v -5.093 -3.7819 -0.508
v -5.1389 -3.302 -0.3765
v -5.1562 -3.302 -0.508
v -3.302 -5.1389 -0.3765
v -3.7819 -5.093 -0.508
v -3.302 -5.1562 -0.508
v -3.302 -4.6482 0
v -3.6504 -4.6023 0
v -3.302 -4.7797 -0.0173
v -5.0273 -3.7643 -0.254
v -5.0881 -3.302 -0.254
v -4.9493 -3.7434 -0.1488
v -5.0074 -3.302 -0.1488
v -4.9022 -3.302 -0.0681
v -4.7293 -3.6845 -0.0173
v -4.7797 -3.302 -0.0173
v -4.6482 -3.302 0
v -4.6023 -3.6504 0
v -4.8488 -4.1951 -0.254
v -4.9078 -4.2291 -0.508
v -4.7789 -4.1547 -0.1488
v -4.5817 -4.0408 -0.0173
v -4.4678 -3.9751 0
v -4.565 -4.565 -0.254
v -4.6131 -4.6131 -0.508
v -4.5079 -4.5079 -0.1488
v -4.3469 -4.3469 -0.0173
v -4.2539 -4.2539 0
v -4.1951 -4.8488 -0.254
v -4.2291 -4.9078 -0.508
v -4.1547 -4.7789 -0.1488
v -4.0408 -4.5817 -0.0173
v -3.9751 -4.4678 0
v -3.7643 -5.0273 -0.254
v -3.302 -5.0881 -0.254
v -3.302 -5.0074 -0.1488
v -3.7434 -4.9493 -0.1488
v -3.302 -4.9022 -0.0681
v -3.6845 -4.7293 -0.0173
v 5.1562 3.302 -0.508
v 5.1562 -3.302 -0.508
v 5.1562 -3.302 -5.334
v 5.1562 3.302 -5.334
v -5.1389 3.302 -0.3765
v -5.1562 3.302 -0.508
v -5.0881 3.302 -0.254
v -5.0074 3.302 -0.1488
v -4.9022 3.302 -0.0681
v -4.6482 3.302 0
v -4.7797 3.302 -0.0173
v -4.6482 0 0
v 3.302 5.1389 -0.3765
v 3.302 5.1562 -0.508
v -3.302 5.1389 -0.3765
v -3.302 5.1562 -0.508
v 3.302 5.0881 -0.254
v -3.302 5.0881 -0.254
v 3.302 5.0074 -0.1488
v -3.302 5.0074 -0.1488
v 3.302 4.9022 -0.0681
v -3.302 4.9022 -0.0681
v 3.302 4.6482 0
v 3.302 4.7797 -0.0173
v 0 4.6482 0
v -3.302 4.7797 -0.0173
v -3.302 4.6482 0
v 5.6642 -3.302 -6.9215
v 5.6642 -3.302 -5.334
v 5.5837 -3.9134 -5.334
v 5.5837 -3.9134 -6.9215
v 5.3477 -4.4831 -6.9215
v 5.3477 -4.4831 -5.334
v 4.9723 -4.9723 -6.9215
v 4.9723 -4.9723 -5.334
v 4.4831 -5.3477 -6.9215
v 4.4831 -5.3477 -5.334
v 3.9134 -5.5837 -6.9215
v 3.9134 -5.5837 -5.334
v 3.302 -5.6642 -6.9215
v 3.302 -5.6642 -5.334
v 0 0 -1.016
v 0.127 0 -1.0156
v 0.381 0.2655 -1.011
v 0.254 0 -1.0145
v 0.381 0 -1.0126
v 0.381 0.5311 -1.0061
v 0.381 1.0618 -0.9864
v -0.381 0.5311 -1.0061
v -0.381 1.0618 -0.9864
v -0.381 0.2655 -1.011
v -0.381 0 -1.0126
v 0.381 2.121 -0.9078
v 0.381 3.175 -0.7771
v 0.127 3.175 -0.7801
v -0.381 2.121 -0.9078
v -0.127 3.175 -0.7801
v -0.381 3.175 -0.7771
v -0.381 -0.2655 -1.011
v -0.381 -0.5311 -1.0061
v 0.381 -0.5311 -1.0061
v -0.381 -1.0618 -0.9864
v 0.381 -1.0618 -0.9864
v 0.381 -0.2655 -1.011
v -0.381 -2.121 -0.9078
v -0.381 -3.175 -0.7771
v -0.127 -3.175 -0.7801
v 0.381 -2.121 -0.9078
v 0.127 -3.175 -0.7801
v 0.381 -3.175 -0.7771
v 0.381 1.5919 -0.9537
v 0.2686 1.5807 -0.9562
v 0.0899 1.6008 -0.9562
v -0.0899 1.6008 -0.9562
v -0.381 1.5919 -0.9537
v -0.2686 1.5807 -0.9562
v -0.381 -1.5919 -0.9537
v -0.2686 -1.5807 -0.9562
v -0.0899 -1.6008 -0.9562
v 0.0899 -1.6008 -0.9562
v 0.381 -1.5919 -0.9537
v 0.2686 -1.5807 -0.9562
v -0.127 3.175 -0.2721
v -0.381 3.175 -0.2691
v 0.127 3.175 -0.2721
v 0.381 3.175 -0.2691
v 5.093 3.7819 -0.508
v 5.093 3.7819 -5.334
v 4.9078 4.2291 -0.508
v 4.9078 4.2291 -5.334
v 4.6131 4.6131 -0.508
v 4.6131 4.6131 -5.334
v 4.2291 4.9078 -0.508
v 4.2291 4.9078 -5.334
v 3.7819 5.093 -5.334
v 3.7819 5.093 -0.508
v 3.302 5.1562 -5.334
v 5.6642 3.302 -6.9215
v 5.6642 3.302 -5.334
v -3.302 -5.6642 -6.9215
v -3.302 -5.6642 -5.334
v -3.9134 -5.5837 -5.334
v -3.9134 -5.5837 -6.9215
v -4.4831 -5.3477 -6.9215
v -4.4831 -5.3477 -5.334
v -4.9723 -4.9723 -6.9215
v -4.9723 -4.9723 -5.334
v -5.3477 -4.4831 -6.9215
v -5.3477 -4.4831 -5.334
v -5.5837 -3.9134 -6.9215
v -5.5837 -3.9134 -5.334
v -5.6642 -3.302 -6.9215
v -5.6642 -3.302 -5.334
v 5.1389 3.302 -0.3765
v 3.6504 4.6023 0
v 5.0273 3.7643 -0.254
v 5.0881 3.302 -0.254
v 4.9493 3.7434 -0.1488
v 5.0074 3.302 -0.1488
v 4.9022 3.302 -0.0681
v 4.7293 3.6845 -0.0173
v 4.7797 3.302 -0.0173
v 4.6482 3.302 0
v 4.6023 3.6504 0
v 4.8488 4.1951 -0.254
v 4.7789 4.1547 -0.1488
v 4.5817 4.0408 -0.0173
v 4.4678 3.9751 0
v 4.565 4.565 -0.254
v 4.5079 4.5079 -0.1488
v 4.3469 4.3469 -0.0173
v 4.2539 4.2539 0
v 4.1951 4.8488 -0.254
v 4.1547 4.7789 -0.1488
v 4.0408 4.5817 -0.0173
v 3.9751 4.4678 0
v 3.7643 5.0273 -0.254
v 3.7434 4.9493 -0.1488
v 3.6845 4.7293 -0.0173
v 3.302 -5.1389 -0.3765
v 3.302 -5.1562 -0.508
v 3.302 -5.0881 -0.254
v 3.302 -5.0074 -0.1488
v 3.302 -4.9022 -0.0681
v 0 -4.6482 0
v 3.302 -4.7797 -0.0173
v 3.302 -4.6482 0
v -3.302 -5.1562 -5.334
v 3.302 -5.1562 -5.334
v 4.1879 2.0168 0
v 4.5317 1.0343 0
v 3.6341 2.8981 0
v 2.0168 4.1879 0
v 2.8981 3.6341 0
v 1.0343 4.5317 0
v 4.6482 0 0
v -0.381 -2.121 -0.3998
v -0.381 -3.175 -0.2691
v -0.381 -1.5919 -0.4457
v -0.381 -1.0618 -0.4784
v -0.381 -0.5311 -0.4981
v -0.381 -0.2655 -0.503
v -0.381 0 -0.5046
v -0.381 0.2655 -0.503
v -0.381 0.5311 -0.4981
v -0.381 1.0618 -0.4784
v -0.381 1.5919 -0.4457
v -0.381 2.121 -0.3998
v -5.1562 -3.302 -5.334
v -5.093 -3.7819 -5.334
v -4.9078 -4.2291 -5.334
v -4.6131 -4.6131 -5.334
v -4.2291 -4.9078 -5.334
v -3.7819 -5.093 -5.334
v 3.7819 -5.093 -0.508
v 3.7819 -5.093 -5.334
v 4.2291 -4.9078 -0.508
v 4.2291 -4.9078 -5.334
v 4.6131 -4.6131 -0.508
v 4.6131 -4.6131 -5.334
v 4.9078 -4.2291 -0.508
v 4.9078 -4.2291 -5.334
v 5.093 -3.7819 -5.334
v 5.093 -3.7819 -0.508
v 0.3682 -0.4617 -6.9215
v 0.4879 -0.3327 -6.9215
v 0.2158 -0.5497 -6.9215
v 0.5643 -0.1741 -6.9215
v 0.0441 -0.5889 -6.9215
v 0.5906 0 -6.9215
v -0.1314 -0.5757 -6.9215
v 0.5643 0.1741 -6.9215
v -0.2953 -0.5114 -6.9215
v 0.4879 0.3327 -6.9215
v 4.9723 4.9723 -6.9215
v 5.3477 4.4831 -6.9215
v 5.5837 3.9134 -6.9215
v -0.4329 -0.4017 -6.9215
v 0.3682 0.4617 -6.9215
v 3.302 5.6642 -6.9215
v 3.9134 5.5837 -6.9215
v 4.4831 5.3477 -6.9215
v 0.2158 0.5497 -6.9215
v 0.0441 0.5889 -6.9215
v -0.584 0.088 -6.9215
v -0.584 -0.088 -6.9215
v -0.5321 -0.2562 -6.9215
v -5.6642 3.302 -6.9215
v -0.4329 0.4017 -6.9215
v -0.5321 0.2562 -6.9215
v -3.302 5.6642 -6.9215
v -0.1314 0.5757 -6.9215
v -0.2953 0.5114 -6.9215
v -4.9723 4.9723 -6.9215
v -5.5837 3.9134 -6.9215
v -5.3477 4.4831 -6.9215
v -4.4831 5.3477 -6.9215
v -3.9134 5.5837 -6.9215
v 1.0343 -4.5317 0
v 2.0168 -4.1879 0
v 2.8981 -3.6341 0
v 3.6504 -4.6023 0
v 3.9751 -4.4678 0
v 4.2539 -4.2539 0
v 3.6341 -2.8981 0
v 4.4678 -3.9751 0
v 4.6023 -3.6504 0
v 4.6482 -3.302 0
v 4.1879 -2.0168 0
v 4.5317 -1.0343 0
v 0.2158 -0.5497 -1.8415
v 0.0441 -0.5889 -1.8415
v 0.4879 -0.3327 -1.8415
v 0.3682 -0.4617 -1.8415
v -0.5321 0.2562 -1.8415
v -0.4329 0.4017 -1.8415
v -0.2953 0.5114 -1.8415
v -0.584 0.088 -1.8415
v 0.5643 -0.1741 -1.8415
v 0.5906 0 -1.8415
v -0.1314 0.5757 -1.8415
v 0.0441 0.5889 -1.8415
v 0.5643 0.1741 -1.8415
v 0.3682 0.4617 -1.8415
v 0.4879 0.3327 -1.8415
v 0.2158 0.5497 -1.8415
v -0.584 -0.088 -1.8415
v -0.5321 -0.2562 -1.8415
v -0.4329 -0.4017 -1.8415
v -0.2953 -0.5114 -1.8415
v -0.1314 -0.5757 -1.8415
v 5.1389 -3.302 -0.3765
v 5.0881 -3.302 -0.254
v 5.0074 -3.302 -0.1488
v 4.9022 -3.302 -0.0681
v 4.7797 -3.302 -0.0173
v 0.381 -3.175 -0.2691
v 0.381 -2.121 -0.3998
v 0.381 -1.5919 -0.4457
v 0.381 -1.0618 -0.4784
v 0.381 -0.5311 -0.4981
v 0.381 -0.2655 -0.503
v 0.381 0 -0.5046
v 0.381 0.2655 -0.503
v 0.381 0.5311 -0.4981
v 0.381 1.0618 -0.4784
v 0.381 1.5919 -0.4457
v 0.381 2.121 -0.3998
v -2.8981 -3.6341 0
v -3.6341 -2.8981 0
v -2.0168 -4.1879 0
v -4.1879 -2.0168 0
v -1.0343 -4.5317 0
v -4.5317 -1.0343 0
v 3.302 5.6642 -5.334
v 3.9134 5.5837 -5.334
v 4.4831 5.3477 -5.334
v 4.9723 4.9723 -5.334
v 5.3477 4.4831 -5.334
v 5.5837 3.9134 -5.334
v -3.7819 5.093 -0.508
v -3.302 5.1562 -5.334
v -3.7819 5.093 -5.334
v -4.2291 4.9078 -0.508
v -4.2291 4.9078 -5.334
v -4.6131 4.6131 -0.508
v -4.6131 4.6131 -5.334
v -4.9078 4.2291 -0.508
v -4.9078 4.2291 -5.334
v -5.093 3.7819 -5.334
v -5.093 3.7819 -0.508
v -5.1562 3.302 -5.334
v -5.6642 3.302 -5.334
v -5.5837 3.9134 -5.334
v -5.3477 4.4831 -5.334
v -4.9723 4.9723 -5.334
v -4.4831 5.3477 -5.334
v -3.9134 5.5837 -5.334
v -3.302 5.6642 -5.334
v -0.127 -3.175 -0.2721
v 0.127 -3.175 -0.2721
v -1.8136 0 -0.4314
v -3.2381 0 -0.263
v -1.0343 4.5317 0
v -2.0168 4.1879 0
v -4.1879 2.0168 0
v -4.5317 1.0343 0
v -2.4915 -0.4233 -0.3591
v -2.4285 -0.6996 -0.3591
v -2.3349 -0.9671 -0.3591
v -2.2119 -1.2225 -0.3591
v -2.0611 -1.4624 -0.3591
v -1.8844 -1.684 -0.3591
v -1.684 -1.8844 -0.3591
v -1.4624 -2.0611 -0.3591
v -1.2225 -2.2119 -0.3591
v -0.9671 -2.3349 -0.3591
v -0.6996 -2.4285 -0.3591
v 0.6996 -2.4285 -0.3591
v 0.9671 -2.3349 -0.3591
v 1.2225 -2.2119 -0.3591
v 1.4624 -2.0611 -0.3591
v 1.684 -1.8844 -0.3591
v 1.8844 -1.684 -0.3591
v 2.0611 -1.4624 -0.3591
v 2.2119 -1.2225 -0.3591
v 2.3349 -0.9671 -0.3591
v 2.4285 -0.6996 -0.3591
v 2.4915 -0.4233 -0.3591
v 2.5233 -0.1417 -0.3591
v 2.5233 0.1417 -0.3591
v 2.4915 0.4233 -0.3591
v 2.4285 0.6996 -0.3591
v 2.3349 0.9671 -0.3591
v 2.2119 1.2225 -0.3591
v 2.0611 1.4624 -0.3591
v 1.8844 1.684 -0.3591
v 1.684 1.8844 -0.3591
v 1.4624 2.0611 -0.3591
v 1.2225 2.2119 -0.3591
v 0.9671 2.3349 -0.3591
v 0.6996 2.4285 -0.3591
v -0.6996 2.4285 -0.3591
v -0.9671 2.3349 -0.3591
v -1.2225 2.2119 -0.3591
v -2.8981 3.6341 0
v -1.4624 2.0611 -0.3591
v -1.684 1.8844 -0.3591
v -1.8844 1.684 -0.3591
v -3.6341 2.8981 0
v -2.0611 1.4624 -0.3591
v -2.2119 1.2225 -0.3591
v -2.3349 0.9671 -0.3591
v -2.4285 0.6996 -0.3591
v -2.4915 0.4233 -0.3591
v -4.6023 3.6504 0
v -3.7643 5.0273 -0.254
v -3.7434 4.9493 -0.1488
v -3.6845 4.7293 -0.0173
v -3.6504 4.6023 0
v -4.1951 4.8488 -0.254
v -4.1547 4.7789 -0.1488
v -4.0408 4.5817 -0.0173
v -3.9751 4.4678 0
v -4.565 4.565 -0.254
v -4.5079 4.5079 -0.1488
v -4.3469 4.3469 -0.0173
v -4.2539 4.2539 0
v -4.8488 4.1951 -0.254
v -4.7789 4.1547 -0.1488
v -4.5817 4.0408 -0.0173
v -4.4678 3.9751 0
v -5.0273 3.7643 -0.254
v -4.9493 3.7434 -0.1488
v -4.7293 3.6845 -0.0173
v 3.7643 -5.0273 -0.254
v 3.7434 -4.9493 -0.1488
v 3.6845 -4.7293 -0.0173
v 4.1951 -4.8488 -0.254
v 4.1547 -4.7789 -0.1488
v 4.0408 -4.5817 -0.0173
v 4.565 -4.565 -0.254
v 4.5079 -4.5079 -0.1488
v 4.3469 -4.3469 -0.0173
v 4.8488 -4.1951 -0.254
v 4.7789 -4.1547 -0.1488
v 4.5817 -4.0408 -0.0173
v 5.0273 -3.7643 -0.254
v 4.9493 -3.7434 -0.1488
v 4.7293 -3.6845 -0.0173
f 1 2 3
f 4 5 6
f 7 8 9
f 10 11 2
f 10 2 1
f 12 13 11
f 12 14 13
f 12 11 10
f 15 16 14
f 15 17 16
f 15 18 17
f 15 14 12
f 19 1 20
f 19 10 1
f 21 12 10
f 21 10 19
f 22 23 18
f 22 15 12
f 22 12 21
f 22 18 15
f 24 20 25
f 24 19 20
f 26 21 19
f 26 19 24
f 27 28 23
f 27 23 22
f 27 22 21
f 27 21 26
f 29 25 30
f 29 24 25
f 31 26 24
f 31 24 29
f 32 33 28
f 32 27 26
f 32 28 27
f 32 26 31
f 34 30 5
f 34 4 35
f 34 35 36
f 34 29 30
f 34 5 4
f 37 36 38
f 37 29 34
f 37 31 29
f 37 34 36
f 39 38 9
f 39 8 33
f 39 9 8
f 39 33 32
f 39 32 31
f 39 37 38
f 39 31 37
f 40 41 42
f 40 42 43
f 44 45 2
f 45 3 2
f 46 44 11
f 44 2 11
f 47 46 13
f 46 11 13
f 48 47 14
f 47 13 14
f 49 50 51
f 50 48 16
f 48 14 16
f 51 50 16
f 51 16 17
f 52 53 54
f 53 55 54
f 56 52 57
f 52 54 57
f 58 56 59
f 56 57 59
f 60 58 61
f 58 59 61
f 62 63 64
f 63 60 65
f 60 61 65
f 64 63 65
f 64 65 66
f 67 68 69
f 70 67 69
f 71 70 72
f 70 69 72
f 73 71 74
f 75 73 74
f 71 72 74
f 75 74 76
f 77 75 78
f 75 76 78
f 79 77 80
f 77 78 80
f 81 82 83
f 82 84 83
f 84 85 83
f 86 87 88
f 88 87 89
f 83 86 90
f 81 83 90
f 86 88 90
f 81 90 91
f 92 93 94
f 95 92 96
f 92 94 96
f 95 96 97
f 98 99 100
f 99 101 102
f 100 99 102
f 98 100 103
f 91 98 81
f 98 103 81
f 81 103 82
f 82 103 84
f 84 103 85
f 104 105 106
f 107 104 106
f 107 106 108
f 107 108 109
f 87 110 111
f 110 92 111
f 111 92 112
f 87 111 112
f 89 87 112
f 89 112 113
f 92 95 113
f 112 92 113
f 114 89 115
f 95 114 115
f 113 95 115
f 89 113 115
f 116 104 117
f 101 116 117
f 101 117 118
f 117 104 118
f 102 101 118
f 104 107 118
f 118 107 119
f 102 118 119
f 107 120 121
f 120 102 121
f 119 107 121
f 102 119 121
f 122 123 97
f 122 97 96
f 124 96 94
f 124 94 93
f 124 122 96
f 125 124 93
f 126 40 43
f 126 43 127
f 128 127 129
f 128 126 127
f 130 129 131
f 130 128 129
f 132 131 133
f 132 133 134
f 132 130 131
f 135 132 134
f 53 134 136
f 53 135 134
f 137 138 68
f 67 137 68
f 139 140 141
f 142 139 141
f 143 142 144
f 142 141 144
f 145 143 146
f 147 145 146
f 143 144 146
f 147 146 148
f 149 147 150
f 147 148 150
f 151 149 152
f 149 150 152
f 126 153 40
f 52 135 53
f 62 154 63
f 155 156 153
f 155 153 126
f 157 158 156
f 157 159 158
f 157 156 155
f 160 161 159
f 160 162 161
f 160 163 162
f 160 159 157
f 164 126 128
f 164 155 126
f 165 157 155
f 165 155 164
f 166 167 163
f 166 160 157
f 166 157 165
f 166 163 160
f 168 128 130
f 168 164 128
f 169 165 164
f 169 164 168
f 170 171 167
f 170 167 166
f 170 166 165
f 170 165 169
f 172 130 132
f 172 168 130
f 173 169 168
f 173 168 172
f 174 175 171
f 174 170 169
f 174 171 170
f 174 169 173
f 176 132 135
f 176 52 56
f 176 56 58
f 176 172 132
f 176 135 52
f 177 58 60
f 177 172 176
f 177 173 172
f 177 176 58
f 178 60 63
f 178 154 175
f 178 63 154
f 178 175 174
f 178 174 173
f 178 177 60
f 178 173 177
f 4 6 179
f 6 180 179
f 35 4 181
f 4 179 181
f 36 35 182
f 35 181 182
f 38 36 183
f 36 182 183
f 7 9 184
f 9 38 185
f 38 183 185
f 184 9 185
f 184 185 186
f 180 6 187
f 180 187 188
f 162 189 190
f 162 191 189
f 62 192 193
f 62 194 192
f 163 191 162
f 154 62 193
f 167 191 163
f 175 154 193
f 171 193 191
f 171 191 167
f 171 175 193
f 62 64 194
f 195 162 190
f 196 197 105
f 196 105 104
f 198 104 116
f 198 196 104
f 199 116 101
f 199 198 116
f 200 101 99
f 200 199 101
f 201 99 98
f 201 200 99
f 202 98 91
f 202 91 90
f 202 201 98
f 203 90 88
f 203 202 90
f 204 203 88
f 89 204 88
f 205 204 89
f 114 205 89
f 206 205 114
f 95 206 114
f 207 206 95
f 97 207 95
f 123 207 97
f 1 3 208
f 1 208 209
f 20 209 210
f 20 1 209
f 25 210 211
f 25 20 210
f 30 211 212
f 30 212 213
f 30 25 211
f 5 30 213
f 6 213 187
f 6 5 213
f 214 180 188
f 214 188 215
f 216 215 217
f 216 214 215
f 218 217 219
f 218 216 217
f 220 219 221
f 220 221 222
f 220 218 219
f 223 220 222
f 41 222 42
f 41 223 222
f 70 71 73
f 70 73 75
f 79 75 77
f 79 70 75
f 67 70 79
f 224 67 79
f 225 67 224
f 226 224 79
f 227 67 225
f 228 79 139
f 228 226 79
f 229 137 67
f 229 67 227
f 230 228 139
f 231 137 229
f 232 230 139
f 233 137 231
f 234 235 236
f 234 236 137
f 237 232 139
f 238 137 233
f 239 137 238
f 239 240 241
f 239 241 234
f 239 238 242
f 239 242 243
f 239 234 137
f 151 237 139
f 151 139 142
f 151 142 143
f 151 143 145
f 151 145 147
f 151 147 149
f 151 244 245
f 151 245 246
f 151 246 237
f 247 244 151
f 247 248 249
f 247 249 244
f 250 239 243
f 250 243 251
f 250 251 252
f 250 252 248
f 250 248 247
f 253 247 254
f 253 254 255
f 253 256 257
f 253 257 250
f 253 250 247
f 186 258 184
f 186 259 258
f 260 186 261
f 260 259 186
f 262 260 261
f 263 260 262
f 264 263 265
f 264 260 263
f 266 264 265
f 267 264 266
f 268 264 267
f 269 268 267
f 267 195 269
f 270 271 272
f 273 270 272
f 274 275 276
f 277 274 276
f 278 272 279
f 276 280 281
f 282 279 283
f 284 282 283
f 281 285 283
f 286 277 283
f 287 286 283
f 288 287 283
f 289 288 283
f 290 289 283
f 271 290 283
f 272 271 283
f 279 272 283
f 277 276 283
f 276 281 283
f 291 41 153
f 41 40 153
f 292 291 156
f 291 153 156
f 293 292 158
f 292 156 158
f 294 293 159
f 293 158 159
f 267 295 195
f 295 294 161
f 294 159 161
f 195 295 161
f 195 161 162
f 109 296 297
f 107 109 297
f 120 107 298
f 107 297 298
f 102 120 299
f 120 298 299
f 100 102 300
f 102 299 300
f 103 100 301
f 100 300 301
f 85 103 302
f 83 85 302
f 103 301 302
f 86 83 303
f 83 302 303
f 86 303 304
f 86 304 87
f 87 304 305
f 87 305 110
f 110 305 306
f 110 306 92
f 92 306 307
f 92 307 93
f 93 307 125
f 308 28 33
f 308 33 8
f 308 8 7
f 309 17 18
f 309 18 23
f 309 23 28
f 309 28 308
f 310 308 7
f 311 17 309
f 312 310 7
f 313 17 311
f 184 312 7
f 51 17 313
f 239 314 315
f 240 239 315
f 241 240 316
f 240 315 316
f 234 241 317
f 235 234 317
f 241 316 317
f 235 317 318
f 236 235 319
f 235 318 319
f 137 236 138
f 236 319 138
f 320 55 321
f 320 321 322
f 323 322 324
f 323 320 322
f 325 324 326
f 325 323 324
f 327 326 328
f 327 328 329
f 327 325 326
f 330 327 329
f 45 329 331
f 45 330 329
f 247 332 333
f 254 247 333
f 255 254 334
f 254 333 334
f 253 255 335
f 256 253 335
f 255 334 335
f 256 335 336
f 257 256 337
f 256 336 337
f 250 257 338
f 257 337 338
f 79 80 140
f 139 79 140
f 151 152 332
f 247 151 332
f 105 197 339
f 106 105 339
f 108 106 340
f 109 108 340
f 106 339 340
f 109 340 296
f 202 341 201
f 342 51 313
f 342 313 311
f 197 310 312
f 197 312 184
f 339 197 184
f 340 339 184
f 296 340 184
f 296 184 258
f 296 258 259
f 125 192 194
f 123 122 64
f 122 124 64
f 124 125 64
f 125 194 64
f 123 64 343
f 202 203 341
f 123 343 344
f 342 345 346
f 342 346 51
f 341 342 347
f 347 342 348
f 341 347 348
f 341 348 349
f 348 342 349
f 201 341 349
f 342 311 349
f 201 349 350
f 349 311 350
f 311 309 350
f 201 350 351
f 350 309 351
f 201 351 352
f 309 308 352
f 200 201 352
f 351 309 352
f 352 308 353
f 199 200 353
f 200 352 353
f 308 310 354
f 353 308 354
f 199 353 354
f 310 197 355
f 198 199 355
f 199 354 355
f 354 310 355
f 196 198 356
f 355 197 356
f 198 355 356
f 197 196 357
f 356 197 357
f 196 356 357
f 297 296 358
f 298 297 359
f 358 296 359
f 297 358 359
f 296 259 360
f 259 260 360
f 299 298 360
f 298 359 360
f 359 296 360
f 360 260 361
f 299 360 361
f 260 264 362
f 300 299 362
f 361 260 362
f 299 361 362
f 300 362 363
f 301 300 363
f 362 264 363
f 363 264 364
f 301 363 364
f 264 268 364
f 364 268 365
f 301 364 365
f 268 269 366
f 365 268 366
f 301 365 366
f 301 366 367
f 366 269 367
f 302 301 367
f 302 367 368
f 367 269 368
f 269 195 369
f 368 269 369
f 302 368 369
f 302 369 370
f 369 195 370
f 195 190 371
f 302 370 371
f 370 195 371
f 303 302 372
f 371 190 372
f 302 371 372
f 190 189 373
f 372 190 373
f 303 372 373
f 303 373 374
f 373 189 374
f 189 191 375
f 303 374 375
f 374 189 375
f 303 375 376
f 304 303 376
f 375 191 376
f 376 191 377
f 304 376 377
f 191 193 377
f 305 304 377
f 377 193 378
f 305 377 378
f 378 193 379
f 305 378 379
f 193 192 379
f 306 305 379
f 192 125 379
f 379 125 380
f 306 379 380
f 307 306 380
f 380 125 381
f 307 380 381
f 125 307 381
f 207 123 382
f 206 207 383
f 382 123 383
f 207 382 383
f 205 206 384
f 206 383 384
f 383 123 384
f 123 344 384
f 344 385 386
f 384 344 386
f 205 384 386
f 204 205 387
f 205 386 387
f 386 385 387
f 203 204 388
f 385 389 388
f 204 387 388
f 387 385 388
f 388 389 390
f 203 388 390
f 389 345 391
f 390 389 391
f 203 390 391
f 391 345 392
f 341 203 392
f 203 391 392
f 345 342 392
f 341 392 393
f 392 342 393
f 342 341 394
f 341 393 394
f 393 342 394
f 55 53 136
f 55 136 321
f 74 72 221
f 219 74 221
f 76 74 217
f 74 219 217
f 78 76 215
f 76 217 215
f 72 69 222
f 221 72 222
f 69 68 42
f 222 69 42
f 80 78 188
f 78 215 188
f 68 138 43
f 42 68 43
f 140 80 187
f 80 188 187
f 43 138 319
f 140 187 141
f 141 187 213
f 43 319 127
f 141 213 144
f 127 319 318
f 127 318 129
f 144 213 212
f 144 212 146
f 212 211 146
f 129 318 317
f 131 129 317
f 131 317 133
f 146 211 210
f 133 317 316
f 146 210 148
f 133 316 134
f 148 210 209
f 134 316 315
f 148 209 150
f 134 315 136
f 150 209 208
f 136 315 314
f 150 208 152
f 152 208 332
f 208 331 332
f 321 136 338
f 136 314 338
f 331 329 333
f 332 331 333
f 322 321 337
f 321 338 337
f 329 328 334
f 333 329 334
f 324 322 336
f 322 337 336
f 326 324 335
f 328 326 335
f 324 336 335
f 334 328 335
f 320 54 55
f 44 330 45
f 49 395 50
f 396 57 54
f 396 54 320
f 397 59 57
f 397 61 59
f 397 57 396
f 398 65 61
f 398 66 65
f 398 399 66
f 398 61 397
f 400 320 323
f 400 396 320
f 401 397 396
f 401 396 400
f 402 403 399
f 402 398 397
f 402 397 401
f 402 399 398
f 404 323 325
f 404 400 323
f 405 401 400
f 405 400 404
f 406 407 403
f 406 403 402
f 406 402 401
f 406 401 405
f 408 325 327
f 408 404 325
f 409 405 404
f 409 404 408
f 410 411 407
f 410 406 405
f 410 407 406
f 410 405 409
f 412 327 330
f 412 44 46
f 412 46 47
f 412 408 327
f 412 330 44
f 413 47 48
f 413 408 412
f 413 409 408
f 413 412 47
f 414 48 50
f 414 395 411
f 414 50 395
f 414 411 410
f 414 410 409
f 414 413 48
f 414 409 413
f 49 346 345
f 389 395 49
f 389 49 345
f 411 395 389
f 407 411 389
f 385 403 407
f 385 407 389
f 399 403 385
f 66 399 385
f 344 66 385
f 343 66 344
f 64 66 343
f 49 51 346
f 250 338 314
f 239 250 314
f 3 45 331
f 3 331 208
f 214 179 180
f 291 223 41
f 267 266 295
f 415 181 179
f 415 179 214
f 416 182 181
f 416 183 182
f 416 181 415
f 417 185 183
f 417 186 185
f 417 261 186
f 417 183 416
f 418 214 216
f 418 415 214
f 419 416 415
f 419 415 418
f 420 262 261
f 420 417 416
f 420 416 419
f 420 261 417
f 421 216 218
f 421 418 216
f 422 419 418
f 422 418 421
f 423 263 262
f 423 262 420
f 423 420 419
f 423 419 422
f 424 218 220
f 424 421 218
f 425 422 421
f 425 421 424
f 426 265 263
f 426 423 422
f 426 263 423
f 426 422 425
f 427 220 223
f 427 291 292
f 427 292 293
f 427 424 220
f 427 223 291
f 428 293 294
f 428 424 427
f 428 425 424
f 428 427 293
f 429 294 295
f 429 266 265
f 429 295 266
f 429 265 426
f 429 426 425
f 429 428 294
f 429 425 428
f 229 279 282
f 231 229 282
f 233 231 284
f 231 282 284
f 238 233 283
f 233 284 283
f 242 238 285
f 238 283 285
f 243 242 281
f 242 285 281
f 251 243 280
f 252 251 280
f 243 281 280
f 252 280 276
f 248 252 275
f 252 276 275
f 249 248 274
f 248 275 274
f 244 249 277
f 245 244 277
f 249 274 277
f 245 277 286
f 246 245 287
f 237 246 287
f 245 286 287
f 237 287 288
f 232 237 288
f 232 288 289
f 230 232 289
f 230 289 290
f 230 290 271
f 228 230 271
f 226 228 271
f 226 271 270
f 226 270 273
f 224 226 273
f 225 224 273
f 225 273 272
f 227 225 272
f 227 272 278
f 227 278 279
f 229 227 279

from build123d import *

# Parameters (mm, degrees)
BOSS_EXTRUDE1_DEPTH              = 5.334
FILLET1_R                        = 0.508
BOSS_EXTRUDE2_DEPTH              = 1.5875
F_56_0_0465_DIAMETER_HOLE1_D     = 1.1811
F_56_0_0465_DIAMETER_HOLE1_DEPTH = 5.08
CUT_EXTRUDE3_REACH               = 13.094
CUT_EXTRUDE3_START_RADIUS        = 21.519514579
CUT_EXTRUDE3_END_RADIUS          = 21.519514579
SKETCH9_W                        = 0.762
SKETCH9_H                        = 6.35


with BuildPart() as part:
    # Sketch1 → Boss-Extrude1 (new body)
    with BuildSketch(Plane.XY):
        with BuildLine():
            Line((3.301999954, 5.156199954), (-3.301999954, 5.156199954))
            ThreePointArc((-3.301999954, 5.156199954), (-4.613117348, 4.613117348), (-5.156199954, 3.301999954))
            Line((-5.156199954, 3.301999954), (-5.156199954, -3.301999954))
            ThreePointArc((-5.156199954, -3.301999954), (-4.613117348, -4.613117348), (-3.301999954, -5.156199954))
            Line((-3.301999954, -5.156199954), (3.301999954, -5.156199954))
            ThreePointArc((3.301999954, -5.156199954), (4.613117348, -4.613117348), (5.156199954, -3.301999954))
            Line((5.156199954, -3.301999954), (5.156199954, 3.301999954))
            ThreePointArc((5.156199954, 3.301999954), (4.613117348, 4.613117348), (3.301999954, 5.156199954))
        make_face()
    extrude(amount=-BOSS_EXTRUDE1_DEPTH)

    # Fillet1
    fillet1_edges = [part.edges().sort_by_distance(p)[0] for p in [
        (0, 5.156199954, 0),
        (4.613117348, 4.613117348, 0),
        (5.156199954, 0, 0),
        (4.613117348, -4.613117348, 0),
        (0, -5.156199954, 0),
        (-4.613117348, -4.613117348, 0),
        (-5.156199954, 0, 0),
        (-4.613117348, 4.613117348, 0),
    ]]
    fillet(fillet1_edges, radius=FILLET1_R)

    # Sketch4 → Boss-Extrude2 (add)
    with BuildSketch(Plane(origin=(0, 0, -5.334), x_dir=(-1, 0, 0), z_dir=(0, 0, -1))):
        with BuildLine():
            Line((-5.664199954, 3.301999954), (-5.664199954, -3.301999954))
            ThreePointArc((-5.664199954, -3.301999954), (-4.972327592, -4.972327592), (-3.301999954, -5.664199954))
            Line((-3.301999954, -5.664199954), (3.301999954, -5.664199954))
            ThreePointArc((3.301999954, -5.664199954), (4.972327592, -4.972327592), (5.664199954, -3.301999954))
            Line((5.664199954, -3.301999954), (5.664199954, 3.301999954))
            ThreePointArc((5.664199954, 3.301999954), (4.972327592, 4.972327592), (3.301999954, 5.664199954))
            Line((3.301999954, 5.664199954), (-3.301999954, 5.664199954))
            ThreePointArc((-3.301999954, 5.664199954), (-4.972327592, 4.972327592), (-5.664199954, 3.301999954))
        make_face()
    extrude(amount=BOSS_EXTRUDE2_DEPTH)

    # #56 (0.0465) Diameter Hole1
    with Locations(Plane(origin=(0, 0, -6.9215), x_dir=(-1, 0, 0), z_dir=(0, 0, -1))):
        with Locations((0, 0)):
            Hole(F_56_0_0465_DIAMETER_HOLE1_D / 2, depth=F_56_0_0465_DIAMETER_HOLE1_DEPTH)

    # Sketch8 → Cut-Revolve1 (revolve, cut)
    with BuildSketch(Plane(origin=(0, 0, 0), x_dir=(0, 0, -1), z_dir=(1, 0, 0)), mode=Mode.PRIVATE) as cut_revolve1_sk:
        with BuildLine():
            Line((0, 4.648199954), (0, 0))
            Line((0, 0), (0.508, 0))
            ThreePointArc((0.508, 0), (0.380623019, 2.337938558), (0, 4.648199954))
        make_face()
    revolve(cut_revolve1_sk.sketch.rotate(Axis((0, 0, -0.508), (0, 0, 1)), 90), axis=Axis((0, 0, -0.508), (0, 0, 1)), mode=Mode.SUBTRACT)

    # Cut-Extrude3: from a sphere face, 13.094 long prism both ways, kept between that surface and its translate by the depth
    cut_extrude3_start = Location((0, 0, 21.011514579)) * Sphere(CUT_EXTRUDE3_START_RADIUS, mode=Mode.PRIVATE)
    cut_extrude3_end = Location((0, 0, 20.503514579)) * Sphere(CUT_EXTRUDE3_END_RADIUS, mode=Mode.PRIVATE)
    # Sketch9 → Cut-Extrude3 (cut, from a surface)
    with BuildSketch(Plane.XY, mode=Mode.PRIVATE) as cut_extrude3_sk1:
        Rectangle(SKETCH9_W, SKETCH9_H)
    cut_extrude3_tool1 = extrude(cut_extrude3_sk1.sketch, amount=CUT_EXTRUDE3_REACH, both=True, mode=Mode.PRIVATE)
    add(((cut_extrude3_tool1 - cut_extrude3_start) & cut_extrude3_end).solids().sort_by_distance((0, 0, -0.52308))[0], mode=Mode.SUBTRACT)


solid = part.part
